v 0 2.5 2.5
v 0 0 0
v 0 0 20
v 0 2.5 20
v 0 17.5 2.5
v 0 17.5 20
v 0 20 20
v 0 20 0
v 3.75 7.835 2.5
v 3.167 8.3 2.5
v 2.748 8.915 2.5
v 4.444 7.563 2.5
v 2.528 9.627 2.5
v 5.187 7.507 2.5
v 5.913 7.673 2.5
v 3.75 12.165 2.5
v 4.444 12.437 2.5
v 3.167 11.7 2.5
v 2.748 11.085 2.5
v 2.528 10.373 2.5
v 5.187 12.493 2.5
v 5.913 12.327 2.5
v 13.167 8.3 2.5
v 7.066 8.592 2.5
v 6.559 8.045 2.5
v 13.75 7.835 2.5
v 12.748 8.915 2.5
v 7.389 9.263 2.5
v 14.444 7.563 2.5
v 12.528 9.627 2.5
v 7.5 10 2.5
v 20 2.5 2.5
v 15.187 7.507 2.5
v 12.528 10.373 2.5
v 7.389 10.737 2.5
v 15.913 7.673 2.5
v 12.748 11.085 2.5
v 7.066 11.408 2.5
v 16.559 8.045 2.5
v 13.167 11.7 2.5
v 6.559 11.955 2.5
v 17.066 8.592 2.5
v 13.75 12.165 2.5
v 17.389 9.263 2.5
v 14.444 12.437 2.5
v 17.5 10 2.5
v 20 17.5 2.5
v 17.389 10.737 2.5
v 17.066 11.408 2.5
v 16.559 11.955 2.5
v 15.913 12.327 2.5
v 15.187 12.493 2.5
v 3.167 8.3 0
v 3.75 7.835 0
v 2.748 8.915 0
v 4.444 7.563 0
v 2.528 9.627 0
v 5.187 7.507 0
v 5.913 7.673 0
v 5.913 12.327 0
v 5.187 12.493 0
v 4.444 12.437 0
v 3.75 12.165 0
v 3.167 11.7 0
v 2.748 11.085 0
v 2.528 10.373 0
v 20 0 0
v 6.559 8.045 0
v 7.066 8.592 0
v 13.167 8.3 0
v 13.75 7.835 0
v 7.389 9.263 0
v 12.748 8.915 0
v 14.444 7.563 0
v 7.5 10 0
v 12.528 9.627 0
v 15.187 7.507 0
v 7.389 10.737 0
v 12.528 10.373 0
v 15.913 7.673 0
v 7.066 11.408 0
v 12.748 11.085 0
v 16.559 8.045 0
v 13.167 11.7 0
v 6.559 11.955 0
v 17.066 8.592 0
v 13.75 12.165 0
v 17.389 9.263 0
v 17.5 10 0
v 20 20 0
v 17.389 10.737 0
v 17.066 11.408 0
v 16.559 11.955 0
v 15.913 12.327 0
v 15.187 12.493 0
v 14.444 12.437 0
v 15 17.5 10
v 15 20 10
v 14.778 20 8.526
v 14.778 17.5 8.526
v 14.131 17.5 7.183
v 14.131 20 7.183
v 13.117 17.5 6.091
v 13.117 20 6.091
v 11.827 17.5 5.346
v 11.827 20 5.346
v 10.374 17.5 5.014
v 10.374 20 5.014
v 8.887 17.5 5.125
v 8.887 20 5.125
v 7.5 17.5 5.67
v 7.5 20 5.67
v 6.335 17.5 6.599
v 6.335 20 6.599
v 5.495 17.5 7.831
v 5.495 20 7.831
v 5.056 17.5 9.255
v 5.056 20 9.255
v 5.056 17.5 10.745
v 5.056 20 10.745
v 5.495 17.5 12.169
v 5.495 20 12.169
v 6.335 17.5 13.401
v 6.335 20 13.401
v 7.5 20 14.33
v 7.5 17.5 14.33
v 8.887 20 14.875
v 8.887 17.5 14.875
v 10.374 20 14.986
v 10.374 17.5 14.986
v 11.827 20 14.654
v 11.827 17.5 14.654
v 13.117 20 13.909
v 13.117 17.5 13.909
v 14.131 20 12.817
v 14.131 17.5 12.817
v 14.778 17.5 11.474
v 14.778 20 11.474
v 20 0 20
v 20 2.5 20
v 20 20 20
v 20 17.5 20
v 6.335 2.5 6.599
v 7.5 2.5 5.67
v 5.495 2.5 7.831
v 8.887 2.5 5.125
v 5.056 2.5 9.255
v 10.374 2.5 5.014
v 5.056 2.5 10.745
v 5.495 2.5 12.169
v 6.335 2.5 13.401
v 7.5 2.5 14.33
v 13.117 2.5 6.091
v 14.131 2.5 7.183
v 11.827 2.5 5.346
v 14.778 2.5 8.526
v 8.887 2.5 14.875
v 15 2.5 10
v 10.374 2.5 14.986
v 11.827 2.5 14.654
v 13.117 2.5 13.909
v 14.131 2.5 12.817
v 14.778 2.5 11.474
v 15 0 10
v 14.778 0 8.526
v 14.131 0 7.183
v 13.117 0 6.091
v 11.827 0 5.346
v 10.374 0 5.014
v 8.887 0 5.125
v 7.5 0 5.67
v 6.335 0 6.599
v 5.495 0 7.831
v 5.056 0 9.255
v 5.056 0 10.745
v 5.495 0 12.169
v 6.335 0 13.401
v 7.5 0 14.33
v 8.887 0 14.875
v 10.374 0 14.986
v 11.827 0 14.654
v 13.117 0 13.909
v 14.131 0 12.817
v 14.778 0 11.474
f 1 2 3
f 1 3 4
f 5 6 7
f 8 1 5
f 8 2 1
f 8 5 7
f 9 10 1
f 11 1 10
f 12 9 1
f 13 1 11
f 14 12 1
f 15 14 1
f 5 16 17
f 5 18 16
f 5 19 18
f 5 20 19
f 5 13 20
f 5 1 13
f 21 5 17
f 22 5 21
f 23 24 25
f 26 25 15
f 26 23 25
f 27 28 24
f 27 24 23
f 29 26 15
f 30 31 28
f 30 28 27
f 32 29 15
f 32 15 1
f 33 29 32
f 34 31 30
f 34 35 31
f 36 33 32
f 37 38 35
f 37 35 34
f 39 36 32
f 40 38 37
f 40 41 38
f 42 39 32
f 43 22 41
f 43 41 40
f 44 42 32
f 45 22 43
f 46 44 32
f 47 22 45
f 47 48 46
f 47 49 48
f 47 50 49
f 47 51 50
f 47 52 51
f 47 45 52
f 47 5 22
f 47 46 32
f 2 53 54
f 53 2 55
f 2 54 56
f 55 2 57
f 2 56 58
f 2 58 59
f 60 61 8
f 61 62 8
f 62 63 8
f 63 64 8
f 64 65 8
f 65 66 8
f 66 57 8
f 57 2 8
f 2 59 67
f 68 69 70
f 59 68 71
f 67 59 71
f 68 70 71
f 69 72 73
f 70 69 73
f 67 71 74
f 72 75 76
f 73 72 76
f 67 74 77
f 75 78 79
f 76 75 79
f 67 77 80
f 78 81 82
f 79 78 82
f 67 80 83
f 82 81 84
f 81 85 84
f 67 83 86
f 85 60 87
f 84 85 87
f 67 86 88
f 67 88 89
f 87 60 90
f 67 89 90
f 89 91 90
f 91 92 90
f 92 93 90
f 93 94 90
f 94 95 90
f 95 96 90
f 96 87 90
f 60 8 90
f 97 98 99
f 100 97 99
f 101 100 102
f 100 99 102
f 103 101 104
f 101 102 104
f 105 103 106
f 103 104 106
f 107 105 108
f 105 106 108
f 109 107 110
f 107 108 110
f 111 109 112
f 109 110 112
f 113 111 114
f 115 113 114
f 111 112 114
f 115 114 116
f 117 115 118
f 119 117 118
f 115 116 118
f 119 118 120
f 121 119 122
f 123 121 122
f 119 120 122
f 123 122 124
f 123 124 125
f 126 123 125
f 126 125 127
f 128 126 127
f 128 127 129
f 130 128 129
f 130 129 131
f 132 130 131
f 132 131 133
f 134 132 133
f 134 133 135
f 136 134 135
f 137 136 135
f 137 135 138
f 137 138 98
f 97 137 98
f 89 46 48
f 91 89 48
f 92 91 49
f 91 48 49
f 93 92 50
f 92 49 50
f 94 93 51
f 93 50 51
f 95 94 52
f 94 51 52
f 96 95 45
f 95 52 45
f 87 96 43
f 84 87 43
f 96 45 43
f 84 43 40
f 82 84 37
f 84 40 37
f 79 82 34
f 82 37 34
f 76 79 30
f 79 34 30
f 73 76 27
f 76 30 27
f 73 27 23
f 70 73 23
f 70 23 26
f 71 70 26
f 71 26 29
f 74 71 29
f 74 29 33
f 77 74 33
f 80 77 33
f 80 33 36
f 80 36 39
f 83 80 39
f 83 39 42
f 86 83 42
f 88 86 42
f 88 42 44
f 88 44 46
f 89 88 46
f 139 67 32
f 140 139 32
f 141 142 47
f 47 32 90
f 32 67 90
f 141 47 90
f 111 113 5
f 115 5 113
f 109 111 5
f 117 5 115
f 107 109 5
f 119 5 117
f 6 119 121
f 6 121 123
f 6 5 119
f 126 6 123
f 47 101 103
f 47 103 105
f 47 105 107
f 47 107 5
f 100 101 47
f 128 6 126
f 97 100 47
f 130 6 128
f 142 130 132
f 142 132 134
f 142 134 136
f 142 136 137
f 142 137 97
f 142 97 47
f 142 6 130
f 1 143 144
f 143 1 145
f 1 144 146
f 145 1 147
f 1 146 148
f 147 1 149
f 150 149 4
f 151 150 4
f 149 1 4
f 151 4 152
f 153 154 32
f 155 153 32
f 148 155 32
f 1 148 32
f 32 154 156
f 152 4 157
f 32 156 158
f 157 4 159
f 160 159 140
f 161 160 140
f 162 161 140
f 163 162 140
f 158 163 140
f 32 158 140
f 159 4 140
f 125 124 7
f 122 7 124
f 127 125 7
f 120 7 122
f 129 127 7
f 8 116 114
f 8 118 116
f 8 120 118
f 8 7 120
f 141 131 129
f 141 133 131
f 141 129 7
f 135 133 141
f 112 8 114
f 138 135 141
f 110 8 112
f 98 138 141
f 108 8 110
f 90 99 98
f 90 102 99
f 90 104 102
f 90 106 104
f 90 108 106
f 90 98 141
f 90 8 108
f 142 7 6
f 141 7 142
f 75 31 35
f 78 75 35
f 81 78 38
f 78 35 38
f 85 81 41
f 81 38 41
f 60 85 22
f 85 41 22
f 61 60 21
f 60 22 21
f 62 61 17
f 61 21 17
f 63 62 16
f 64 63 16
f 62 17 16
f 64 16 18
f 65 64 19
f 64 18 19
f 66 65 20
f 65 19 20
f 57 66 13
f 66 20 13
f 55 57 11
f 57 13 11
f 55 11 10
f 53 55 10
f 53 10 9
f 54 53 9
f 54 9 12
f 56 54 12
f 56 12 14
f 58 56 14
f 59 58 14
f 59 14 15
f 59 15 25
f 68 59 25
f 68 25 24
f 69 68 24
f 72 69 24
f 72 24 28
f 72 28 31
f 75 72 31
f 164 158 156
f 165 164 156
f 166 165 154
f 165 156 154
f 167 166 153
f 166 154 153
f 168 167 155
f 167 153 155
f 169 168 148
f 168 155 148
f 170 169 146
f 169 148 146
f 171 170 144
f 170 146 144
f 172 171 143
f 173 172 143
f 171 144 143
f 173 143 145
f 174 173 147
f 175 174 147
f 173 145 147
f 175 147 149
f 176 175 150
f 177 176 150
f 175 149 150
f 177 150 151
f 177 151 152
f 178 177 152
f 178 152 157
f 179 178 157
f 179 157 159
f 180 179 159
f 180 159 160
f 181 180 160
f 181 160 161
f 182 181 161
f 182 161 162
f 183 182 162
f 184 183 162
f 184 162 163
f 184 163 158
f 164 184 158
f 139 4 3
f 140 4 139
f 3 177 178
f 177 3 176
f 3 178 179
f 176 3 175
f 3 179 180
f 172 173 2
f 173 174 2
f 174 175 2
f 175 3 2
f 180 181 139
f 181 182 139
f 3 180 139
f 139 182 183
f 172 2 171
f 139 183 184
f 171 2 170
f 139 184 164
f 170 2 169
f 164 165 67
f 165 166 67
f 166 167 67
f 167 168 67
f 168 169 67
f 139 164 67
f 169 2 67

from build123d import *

# Parameters (mm, degrees)
SKETCH1_W           = 20
SKETCH1_H           = 20
BOSS_EXTRUDE1_DEPTH = 20
SKETCH2_W           = 20
SKETCH2_H           = 15
CUT_EXTRUDE1_DEPTH  = 17.5
SKETCH3_R           = 5
CUT_EXTRUDE2_DEPTH  = 21
SKETCH4_R           = 2.5
CUT_EXTRUDE3_DEPTH  = 3.5


with BuildPart() as part:
    # Sketch1 → Boss-Extrude1 (new body)
    with BuildSketch(Plane.XY):
        with Locations((10, 10)):
            Rectangle(SKETCH1_W, SKETCH1_H)
    extrude(amount=BOSS_EXTRUDE1_DEPTH)

    # Sketch2 → Cut-Extrude1 (cut)
    with BuildSketch(Plane.XY.offset(20)):
        with Locations((10, 10)):
            Rectangle(SKETCH2_W, SKETCH2_H)
    extrude(amount=-CUT_EXTRUDE1_DEPTH, mode=Mode.SUBTRACT)

    # Sketch3 → Cut-Extrude2 (cut, through all)
    with BuildSketch(Plane(origin=(0, 20, 0), x_dir=(1, 0, 0), z_dir=(0, 1, 0))):
        with Locations((10, -10)):
            Circle(SKETCH3_R)
    extrude(amount=-CUT_EXTRUDE2_DEPTH, mode=Mode.SUBTRACT)

    # Sketch4 → Cut-Extrude3 (cut, through all)
    with BuildSketch(Plane.XY.offset(2.5)):
        with Locations((15, 10)):
            Circle(SKETCH4_R)
        with Locations((5, 10)):
            Circle(SKETCH4_R)
    extrude(amount=-CUT_EXTRUDE3_DEPTH, mode=Mode.SUBTRACT)


solid = part.part
